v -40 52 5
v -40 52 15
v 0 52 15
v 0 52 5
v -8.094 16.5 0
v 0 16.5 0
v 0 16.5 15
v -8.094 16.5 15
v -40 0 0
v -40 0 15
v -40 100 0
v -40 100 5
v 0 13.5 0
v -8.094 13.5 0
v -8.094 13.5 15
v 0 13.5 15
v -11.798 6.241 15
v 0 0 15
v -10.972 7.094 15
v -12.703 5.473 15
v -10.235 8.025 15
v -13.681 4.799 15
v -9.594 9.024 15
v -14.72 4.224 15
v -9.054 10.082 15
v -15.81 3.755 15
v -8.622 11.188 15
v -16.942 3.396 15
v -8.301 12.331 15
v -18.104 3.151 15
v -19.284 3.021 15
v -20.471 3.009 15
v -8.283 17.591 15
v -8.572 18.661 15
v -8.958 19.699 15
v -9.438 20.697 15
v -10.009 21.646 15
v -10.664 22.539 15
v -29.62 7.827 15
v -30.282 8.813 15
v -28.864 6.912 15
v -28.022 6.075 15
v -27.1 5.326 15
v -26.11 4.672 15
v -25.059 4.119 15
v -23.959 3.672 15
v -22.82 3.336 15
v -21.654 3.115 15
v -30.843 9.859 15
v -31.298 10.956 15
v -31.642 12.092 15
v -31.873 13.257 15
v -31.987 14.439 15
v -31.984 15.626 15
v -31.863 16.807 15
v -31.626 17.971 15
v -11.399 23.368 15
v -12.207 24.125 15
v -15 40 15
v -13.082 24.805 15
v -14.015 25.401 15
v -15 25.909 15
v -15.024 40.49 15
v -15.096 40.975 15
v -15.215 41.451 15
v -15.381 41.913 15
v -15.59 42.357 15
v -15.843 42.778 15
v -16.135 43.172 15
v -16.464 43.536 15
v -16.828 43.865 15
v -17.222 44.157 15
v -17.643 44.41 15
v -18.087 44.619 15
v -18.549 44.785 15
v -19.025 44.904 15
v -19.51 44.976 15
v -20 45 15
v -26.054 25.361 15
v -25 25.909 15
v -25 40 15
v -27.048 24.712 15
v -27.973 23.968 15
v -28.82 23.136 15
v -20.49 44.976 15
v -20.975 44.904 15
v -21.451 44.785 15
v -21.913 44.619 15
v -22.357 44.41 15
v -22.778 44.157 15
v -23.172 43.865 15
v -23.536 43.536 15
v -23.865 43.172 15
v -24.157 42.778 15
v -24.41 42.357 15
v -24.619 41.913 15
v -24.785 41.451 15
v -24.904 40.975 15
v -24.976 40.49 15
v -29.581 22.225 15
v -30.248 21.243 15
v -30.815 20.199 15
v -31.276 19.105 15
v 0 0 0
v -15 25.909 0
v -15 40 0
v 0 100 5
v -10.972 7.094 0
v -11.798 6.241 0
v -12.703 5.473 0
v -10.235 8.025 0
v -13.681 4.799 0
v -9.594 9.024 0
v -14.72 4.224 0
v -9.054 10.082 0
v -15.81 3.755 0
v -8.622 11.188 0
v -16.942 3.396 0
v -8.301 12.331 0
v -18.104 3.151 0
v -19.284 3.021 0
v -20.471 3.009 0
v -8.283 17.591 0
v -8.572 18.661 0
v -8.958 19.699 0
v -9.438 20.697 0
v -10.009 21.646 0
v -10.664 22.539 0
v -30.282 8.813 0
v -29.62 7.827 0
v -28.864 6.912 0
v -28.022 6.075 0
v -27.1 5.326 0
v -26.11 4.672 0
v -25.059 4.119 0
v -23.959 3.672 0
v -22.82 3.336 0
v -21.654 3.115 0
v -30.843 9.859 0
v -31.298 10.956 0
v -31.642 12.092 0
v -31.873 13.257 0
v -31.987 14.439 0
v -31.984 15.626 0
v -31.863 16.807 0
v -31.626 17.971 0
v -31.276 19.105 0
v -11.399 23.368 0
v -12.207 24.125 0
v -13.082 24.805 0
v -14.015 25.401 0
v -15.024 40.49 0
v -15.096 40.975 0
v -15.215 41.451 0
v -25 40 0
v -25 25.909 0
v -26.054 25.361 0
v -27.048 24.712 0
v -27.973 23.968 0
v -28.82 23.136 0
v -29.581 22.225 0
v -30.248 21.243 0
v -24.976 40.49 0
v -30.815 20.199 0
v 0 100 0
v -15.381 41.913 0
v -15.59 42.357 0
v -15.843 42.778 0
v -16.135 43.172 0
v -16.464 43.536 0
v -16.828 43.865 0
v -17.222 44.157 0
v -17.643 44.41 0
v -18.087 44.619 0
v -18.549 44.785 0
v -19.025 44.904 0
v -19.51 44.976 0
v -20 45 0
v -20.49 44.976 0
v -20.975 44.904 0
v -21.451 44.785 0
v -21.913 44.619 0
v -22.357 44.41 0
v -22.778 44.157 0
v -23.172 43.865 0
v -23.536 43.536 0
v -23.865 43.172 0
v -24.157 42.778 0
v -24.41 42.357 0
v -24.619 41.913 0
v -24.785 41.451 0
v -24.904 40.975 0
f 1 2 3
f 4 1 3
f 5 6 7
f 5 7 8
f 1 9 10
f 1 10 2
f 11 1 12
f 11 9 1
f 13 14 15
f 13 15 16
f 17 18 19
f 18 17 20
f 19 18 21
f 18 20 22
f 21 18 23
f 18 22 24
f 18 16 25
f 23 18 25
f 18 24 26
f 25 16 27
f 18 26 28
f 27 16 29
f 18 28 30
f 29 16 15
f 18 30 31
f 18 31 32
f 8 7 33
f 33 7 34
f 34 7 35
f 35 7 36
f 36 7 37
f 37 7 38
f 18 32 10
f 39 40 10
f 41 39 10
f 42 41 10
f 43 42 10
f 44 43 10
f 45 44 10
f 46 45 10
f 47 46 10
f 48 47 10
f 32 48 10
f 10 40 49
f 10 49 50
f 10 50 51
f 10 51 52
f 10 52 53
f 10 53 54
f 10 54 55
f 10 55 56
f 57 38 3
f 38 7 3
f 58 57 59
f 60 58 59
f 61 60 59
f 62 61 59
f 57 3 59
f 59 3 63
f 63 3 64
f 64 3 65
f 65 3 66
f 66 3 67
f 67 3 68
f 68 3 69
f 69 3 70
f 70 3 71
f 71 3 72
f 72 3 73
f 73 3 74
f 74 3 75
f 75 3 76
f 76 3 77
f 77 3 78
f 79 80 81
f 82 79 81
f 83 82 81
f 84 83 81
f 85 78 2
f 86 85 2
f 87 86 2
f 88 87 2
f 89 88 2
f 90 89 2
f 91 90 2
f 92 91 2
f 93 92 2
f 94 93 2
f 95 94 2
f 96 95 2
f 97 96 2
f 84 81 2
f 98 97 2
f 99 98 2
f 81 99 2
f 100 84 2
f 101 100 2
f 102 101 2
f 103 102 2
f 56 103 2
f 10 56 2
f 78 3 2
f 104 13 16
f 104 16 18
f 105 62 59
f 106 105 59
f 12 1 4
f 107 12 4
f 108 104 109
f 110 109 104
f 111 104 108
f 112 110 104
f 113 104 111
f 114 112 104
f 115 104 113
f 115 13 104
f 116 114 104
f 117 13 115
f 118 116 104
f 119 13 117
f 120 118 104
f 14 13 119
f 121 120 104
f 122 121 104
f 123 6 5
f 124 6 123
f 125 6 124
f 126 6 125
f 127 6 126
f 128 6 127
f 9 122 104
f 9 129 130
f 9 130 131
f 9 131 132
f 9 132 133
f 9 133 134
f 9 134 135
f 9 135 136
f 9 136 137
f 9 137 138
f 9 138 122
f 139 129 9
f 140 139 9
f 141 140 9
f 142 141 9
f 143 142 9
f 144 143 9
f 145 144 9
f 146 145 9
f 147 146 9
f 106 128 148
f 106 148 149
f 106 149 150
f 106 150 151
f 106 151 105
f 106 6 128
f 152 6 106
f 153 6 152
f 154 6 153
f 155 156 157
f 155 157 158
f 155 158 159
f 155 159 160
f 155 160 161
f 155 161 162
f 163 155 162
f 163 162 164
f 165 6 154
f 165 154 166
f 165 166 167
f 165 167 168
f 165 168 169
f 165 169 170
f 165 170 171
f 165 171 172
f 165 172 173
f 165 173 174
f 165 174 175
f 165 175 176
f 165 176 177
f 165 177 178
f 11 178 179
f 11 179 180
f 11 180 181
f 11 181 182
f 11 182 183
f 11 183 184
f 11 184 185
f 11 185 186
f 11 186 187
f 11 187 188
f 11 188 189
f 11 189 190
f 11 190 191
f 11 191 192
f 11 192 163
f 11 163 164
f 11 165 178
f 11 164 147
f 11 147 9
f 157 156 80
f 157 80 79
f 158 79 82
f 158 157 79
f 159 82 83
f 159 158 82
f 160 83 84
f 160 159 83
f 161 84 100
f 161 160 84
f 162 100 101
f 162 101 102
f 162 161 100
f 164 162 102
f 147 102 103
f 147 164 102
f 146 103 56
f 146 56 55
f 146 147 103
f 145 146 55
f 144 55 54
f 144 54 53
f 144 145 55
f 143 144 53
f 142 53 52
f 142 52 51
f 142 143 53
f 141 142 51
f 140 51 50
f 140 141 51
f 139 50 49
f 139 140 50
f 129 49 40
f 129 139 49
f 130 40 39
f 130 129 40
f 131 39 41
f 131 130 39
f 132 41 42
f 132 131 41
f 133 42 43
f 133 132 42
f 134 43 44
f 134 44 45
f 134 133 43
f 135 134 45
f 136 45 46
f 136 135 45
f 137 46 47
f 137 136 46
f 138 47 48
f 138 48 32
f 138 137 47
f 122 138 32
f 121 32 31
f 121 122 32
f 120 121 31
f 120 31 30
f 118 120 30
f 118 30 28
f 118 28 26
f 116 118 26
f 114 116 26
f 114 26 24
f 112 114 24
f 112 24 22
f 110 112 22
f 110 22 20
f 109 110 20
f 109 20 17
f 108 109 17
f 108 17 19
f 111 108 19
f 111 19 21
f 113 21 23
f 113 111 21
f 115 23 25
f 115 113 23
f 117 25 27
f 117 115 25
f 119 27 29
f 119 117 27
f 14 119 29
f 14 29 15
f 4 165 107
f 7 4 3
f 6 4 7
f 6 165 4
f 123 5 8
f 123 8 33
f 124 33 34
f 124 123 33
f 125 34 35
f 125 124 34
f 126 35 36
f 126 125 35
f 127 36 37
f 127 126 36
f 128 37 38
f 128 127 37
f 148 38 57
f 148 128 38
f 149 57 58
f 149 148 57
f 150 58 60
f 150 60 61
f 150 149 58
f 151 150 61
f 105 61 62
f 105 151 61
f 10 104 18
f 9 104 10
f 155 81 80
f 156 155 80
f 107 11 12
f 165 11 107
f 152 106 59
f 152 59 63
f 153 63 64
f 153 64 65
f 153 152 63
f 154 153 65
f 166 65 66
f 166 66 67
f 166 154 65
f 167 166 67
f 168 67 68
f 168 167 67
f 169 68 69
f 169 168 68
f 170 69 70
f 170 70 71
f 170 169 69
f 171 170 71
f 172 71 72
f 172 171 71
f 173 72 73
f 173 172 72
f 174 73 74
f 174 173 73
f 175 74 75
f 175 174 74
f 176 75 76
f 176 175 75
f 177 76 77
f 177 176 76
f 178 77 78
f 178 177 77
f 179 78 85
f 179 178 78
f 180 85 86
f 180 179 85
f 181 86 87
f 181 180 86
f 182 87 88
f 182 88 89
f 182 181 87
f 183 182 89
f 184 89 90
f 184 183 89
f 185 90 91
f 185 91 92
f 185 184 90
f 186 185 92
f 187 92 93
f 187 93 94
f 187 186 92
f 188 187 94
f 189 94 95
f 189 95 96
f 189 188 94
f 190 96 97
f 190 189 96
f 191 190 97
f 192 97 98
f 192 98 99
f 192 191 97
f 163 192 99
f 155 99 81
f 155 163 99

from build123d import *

# Parameters (mm, degrees)
EXTRUSION1_DEPTH = 15
ESQUISSE2_W      = 40
ESQUISSE2_H      = 48
EXTRUSION2_DEPTH = 10


with BuildPart() as part:
    # Esquisse1 → Extrusion1 (new body)
    with BuildSketch(Plane.XY):
        with BuildLine():
            Line((0, 0), (-40, 0))
            Line((-40, 0), (-40, 100))
            Line((-40, 100), (0, 100))
            Line((0, 100), (0, 16.5))
            Line((0, 16.5), (-8.0941191, 16.5))
            ThreePointArc((-8.0941191, 16.5), (-10.32616063, 22.100481099), (-15, 25.908712115))
            Line((-15, 25.908712115), (-15, 40))
            ThreePointArc((-15, 40), (-20, 45), (-25, 40))
            Line((-25, 40), (-25, 25.908712115))
            ThreePointArc((-25, 25.908712115), (-27.100481099, 5.32616063), (-8.0941191, 13.5))
            Line((-8.0941191, 13.5), (0, 13.5))
            Line((0, 13.5), (0, 0))
        make_face()
    extrude(amount=EXTRUSION1_DEPTH)

    # Esquisse2 → Extrusion2 (cut)
    with BuildSketch(Plane.XY.offset(15)):
        with Locations((-20, 76)):
            Rectangle(ESQUISSE2_W, ESQUISSE2_H)
    extrude(amount=-EXTRUSION2_DEPTH, mode=Mode.SUBTRACT)


solid = part.part
